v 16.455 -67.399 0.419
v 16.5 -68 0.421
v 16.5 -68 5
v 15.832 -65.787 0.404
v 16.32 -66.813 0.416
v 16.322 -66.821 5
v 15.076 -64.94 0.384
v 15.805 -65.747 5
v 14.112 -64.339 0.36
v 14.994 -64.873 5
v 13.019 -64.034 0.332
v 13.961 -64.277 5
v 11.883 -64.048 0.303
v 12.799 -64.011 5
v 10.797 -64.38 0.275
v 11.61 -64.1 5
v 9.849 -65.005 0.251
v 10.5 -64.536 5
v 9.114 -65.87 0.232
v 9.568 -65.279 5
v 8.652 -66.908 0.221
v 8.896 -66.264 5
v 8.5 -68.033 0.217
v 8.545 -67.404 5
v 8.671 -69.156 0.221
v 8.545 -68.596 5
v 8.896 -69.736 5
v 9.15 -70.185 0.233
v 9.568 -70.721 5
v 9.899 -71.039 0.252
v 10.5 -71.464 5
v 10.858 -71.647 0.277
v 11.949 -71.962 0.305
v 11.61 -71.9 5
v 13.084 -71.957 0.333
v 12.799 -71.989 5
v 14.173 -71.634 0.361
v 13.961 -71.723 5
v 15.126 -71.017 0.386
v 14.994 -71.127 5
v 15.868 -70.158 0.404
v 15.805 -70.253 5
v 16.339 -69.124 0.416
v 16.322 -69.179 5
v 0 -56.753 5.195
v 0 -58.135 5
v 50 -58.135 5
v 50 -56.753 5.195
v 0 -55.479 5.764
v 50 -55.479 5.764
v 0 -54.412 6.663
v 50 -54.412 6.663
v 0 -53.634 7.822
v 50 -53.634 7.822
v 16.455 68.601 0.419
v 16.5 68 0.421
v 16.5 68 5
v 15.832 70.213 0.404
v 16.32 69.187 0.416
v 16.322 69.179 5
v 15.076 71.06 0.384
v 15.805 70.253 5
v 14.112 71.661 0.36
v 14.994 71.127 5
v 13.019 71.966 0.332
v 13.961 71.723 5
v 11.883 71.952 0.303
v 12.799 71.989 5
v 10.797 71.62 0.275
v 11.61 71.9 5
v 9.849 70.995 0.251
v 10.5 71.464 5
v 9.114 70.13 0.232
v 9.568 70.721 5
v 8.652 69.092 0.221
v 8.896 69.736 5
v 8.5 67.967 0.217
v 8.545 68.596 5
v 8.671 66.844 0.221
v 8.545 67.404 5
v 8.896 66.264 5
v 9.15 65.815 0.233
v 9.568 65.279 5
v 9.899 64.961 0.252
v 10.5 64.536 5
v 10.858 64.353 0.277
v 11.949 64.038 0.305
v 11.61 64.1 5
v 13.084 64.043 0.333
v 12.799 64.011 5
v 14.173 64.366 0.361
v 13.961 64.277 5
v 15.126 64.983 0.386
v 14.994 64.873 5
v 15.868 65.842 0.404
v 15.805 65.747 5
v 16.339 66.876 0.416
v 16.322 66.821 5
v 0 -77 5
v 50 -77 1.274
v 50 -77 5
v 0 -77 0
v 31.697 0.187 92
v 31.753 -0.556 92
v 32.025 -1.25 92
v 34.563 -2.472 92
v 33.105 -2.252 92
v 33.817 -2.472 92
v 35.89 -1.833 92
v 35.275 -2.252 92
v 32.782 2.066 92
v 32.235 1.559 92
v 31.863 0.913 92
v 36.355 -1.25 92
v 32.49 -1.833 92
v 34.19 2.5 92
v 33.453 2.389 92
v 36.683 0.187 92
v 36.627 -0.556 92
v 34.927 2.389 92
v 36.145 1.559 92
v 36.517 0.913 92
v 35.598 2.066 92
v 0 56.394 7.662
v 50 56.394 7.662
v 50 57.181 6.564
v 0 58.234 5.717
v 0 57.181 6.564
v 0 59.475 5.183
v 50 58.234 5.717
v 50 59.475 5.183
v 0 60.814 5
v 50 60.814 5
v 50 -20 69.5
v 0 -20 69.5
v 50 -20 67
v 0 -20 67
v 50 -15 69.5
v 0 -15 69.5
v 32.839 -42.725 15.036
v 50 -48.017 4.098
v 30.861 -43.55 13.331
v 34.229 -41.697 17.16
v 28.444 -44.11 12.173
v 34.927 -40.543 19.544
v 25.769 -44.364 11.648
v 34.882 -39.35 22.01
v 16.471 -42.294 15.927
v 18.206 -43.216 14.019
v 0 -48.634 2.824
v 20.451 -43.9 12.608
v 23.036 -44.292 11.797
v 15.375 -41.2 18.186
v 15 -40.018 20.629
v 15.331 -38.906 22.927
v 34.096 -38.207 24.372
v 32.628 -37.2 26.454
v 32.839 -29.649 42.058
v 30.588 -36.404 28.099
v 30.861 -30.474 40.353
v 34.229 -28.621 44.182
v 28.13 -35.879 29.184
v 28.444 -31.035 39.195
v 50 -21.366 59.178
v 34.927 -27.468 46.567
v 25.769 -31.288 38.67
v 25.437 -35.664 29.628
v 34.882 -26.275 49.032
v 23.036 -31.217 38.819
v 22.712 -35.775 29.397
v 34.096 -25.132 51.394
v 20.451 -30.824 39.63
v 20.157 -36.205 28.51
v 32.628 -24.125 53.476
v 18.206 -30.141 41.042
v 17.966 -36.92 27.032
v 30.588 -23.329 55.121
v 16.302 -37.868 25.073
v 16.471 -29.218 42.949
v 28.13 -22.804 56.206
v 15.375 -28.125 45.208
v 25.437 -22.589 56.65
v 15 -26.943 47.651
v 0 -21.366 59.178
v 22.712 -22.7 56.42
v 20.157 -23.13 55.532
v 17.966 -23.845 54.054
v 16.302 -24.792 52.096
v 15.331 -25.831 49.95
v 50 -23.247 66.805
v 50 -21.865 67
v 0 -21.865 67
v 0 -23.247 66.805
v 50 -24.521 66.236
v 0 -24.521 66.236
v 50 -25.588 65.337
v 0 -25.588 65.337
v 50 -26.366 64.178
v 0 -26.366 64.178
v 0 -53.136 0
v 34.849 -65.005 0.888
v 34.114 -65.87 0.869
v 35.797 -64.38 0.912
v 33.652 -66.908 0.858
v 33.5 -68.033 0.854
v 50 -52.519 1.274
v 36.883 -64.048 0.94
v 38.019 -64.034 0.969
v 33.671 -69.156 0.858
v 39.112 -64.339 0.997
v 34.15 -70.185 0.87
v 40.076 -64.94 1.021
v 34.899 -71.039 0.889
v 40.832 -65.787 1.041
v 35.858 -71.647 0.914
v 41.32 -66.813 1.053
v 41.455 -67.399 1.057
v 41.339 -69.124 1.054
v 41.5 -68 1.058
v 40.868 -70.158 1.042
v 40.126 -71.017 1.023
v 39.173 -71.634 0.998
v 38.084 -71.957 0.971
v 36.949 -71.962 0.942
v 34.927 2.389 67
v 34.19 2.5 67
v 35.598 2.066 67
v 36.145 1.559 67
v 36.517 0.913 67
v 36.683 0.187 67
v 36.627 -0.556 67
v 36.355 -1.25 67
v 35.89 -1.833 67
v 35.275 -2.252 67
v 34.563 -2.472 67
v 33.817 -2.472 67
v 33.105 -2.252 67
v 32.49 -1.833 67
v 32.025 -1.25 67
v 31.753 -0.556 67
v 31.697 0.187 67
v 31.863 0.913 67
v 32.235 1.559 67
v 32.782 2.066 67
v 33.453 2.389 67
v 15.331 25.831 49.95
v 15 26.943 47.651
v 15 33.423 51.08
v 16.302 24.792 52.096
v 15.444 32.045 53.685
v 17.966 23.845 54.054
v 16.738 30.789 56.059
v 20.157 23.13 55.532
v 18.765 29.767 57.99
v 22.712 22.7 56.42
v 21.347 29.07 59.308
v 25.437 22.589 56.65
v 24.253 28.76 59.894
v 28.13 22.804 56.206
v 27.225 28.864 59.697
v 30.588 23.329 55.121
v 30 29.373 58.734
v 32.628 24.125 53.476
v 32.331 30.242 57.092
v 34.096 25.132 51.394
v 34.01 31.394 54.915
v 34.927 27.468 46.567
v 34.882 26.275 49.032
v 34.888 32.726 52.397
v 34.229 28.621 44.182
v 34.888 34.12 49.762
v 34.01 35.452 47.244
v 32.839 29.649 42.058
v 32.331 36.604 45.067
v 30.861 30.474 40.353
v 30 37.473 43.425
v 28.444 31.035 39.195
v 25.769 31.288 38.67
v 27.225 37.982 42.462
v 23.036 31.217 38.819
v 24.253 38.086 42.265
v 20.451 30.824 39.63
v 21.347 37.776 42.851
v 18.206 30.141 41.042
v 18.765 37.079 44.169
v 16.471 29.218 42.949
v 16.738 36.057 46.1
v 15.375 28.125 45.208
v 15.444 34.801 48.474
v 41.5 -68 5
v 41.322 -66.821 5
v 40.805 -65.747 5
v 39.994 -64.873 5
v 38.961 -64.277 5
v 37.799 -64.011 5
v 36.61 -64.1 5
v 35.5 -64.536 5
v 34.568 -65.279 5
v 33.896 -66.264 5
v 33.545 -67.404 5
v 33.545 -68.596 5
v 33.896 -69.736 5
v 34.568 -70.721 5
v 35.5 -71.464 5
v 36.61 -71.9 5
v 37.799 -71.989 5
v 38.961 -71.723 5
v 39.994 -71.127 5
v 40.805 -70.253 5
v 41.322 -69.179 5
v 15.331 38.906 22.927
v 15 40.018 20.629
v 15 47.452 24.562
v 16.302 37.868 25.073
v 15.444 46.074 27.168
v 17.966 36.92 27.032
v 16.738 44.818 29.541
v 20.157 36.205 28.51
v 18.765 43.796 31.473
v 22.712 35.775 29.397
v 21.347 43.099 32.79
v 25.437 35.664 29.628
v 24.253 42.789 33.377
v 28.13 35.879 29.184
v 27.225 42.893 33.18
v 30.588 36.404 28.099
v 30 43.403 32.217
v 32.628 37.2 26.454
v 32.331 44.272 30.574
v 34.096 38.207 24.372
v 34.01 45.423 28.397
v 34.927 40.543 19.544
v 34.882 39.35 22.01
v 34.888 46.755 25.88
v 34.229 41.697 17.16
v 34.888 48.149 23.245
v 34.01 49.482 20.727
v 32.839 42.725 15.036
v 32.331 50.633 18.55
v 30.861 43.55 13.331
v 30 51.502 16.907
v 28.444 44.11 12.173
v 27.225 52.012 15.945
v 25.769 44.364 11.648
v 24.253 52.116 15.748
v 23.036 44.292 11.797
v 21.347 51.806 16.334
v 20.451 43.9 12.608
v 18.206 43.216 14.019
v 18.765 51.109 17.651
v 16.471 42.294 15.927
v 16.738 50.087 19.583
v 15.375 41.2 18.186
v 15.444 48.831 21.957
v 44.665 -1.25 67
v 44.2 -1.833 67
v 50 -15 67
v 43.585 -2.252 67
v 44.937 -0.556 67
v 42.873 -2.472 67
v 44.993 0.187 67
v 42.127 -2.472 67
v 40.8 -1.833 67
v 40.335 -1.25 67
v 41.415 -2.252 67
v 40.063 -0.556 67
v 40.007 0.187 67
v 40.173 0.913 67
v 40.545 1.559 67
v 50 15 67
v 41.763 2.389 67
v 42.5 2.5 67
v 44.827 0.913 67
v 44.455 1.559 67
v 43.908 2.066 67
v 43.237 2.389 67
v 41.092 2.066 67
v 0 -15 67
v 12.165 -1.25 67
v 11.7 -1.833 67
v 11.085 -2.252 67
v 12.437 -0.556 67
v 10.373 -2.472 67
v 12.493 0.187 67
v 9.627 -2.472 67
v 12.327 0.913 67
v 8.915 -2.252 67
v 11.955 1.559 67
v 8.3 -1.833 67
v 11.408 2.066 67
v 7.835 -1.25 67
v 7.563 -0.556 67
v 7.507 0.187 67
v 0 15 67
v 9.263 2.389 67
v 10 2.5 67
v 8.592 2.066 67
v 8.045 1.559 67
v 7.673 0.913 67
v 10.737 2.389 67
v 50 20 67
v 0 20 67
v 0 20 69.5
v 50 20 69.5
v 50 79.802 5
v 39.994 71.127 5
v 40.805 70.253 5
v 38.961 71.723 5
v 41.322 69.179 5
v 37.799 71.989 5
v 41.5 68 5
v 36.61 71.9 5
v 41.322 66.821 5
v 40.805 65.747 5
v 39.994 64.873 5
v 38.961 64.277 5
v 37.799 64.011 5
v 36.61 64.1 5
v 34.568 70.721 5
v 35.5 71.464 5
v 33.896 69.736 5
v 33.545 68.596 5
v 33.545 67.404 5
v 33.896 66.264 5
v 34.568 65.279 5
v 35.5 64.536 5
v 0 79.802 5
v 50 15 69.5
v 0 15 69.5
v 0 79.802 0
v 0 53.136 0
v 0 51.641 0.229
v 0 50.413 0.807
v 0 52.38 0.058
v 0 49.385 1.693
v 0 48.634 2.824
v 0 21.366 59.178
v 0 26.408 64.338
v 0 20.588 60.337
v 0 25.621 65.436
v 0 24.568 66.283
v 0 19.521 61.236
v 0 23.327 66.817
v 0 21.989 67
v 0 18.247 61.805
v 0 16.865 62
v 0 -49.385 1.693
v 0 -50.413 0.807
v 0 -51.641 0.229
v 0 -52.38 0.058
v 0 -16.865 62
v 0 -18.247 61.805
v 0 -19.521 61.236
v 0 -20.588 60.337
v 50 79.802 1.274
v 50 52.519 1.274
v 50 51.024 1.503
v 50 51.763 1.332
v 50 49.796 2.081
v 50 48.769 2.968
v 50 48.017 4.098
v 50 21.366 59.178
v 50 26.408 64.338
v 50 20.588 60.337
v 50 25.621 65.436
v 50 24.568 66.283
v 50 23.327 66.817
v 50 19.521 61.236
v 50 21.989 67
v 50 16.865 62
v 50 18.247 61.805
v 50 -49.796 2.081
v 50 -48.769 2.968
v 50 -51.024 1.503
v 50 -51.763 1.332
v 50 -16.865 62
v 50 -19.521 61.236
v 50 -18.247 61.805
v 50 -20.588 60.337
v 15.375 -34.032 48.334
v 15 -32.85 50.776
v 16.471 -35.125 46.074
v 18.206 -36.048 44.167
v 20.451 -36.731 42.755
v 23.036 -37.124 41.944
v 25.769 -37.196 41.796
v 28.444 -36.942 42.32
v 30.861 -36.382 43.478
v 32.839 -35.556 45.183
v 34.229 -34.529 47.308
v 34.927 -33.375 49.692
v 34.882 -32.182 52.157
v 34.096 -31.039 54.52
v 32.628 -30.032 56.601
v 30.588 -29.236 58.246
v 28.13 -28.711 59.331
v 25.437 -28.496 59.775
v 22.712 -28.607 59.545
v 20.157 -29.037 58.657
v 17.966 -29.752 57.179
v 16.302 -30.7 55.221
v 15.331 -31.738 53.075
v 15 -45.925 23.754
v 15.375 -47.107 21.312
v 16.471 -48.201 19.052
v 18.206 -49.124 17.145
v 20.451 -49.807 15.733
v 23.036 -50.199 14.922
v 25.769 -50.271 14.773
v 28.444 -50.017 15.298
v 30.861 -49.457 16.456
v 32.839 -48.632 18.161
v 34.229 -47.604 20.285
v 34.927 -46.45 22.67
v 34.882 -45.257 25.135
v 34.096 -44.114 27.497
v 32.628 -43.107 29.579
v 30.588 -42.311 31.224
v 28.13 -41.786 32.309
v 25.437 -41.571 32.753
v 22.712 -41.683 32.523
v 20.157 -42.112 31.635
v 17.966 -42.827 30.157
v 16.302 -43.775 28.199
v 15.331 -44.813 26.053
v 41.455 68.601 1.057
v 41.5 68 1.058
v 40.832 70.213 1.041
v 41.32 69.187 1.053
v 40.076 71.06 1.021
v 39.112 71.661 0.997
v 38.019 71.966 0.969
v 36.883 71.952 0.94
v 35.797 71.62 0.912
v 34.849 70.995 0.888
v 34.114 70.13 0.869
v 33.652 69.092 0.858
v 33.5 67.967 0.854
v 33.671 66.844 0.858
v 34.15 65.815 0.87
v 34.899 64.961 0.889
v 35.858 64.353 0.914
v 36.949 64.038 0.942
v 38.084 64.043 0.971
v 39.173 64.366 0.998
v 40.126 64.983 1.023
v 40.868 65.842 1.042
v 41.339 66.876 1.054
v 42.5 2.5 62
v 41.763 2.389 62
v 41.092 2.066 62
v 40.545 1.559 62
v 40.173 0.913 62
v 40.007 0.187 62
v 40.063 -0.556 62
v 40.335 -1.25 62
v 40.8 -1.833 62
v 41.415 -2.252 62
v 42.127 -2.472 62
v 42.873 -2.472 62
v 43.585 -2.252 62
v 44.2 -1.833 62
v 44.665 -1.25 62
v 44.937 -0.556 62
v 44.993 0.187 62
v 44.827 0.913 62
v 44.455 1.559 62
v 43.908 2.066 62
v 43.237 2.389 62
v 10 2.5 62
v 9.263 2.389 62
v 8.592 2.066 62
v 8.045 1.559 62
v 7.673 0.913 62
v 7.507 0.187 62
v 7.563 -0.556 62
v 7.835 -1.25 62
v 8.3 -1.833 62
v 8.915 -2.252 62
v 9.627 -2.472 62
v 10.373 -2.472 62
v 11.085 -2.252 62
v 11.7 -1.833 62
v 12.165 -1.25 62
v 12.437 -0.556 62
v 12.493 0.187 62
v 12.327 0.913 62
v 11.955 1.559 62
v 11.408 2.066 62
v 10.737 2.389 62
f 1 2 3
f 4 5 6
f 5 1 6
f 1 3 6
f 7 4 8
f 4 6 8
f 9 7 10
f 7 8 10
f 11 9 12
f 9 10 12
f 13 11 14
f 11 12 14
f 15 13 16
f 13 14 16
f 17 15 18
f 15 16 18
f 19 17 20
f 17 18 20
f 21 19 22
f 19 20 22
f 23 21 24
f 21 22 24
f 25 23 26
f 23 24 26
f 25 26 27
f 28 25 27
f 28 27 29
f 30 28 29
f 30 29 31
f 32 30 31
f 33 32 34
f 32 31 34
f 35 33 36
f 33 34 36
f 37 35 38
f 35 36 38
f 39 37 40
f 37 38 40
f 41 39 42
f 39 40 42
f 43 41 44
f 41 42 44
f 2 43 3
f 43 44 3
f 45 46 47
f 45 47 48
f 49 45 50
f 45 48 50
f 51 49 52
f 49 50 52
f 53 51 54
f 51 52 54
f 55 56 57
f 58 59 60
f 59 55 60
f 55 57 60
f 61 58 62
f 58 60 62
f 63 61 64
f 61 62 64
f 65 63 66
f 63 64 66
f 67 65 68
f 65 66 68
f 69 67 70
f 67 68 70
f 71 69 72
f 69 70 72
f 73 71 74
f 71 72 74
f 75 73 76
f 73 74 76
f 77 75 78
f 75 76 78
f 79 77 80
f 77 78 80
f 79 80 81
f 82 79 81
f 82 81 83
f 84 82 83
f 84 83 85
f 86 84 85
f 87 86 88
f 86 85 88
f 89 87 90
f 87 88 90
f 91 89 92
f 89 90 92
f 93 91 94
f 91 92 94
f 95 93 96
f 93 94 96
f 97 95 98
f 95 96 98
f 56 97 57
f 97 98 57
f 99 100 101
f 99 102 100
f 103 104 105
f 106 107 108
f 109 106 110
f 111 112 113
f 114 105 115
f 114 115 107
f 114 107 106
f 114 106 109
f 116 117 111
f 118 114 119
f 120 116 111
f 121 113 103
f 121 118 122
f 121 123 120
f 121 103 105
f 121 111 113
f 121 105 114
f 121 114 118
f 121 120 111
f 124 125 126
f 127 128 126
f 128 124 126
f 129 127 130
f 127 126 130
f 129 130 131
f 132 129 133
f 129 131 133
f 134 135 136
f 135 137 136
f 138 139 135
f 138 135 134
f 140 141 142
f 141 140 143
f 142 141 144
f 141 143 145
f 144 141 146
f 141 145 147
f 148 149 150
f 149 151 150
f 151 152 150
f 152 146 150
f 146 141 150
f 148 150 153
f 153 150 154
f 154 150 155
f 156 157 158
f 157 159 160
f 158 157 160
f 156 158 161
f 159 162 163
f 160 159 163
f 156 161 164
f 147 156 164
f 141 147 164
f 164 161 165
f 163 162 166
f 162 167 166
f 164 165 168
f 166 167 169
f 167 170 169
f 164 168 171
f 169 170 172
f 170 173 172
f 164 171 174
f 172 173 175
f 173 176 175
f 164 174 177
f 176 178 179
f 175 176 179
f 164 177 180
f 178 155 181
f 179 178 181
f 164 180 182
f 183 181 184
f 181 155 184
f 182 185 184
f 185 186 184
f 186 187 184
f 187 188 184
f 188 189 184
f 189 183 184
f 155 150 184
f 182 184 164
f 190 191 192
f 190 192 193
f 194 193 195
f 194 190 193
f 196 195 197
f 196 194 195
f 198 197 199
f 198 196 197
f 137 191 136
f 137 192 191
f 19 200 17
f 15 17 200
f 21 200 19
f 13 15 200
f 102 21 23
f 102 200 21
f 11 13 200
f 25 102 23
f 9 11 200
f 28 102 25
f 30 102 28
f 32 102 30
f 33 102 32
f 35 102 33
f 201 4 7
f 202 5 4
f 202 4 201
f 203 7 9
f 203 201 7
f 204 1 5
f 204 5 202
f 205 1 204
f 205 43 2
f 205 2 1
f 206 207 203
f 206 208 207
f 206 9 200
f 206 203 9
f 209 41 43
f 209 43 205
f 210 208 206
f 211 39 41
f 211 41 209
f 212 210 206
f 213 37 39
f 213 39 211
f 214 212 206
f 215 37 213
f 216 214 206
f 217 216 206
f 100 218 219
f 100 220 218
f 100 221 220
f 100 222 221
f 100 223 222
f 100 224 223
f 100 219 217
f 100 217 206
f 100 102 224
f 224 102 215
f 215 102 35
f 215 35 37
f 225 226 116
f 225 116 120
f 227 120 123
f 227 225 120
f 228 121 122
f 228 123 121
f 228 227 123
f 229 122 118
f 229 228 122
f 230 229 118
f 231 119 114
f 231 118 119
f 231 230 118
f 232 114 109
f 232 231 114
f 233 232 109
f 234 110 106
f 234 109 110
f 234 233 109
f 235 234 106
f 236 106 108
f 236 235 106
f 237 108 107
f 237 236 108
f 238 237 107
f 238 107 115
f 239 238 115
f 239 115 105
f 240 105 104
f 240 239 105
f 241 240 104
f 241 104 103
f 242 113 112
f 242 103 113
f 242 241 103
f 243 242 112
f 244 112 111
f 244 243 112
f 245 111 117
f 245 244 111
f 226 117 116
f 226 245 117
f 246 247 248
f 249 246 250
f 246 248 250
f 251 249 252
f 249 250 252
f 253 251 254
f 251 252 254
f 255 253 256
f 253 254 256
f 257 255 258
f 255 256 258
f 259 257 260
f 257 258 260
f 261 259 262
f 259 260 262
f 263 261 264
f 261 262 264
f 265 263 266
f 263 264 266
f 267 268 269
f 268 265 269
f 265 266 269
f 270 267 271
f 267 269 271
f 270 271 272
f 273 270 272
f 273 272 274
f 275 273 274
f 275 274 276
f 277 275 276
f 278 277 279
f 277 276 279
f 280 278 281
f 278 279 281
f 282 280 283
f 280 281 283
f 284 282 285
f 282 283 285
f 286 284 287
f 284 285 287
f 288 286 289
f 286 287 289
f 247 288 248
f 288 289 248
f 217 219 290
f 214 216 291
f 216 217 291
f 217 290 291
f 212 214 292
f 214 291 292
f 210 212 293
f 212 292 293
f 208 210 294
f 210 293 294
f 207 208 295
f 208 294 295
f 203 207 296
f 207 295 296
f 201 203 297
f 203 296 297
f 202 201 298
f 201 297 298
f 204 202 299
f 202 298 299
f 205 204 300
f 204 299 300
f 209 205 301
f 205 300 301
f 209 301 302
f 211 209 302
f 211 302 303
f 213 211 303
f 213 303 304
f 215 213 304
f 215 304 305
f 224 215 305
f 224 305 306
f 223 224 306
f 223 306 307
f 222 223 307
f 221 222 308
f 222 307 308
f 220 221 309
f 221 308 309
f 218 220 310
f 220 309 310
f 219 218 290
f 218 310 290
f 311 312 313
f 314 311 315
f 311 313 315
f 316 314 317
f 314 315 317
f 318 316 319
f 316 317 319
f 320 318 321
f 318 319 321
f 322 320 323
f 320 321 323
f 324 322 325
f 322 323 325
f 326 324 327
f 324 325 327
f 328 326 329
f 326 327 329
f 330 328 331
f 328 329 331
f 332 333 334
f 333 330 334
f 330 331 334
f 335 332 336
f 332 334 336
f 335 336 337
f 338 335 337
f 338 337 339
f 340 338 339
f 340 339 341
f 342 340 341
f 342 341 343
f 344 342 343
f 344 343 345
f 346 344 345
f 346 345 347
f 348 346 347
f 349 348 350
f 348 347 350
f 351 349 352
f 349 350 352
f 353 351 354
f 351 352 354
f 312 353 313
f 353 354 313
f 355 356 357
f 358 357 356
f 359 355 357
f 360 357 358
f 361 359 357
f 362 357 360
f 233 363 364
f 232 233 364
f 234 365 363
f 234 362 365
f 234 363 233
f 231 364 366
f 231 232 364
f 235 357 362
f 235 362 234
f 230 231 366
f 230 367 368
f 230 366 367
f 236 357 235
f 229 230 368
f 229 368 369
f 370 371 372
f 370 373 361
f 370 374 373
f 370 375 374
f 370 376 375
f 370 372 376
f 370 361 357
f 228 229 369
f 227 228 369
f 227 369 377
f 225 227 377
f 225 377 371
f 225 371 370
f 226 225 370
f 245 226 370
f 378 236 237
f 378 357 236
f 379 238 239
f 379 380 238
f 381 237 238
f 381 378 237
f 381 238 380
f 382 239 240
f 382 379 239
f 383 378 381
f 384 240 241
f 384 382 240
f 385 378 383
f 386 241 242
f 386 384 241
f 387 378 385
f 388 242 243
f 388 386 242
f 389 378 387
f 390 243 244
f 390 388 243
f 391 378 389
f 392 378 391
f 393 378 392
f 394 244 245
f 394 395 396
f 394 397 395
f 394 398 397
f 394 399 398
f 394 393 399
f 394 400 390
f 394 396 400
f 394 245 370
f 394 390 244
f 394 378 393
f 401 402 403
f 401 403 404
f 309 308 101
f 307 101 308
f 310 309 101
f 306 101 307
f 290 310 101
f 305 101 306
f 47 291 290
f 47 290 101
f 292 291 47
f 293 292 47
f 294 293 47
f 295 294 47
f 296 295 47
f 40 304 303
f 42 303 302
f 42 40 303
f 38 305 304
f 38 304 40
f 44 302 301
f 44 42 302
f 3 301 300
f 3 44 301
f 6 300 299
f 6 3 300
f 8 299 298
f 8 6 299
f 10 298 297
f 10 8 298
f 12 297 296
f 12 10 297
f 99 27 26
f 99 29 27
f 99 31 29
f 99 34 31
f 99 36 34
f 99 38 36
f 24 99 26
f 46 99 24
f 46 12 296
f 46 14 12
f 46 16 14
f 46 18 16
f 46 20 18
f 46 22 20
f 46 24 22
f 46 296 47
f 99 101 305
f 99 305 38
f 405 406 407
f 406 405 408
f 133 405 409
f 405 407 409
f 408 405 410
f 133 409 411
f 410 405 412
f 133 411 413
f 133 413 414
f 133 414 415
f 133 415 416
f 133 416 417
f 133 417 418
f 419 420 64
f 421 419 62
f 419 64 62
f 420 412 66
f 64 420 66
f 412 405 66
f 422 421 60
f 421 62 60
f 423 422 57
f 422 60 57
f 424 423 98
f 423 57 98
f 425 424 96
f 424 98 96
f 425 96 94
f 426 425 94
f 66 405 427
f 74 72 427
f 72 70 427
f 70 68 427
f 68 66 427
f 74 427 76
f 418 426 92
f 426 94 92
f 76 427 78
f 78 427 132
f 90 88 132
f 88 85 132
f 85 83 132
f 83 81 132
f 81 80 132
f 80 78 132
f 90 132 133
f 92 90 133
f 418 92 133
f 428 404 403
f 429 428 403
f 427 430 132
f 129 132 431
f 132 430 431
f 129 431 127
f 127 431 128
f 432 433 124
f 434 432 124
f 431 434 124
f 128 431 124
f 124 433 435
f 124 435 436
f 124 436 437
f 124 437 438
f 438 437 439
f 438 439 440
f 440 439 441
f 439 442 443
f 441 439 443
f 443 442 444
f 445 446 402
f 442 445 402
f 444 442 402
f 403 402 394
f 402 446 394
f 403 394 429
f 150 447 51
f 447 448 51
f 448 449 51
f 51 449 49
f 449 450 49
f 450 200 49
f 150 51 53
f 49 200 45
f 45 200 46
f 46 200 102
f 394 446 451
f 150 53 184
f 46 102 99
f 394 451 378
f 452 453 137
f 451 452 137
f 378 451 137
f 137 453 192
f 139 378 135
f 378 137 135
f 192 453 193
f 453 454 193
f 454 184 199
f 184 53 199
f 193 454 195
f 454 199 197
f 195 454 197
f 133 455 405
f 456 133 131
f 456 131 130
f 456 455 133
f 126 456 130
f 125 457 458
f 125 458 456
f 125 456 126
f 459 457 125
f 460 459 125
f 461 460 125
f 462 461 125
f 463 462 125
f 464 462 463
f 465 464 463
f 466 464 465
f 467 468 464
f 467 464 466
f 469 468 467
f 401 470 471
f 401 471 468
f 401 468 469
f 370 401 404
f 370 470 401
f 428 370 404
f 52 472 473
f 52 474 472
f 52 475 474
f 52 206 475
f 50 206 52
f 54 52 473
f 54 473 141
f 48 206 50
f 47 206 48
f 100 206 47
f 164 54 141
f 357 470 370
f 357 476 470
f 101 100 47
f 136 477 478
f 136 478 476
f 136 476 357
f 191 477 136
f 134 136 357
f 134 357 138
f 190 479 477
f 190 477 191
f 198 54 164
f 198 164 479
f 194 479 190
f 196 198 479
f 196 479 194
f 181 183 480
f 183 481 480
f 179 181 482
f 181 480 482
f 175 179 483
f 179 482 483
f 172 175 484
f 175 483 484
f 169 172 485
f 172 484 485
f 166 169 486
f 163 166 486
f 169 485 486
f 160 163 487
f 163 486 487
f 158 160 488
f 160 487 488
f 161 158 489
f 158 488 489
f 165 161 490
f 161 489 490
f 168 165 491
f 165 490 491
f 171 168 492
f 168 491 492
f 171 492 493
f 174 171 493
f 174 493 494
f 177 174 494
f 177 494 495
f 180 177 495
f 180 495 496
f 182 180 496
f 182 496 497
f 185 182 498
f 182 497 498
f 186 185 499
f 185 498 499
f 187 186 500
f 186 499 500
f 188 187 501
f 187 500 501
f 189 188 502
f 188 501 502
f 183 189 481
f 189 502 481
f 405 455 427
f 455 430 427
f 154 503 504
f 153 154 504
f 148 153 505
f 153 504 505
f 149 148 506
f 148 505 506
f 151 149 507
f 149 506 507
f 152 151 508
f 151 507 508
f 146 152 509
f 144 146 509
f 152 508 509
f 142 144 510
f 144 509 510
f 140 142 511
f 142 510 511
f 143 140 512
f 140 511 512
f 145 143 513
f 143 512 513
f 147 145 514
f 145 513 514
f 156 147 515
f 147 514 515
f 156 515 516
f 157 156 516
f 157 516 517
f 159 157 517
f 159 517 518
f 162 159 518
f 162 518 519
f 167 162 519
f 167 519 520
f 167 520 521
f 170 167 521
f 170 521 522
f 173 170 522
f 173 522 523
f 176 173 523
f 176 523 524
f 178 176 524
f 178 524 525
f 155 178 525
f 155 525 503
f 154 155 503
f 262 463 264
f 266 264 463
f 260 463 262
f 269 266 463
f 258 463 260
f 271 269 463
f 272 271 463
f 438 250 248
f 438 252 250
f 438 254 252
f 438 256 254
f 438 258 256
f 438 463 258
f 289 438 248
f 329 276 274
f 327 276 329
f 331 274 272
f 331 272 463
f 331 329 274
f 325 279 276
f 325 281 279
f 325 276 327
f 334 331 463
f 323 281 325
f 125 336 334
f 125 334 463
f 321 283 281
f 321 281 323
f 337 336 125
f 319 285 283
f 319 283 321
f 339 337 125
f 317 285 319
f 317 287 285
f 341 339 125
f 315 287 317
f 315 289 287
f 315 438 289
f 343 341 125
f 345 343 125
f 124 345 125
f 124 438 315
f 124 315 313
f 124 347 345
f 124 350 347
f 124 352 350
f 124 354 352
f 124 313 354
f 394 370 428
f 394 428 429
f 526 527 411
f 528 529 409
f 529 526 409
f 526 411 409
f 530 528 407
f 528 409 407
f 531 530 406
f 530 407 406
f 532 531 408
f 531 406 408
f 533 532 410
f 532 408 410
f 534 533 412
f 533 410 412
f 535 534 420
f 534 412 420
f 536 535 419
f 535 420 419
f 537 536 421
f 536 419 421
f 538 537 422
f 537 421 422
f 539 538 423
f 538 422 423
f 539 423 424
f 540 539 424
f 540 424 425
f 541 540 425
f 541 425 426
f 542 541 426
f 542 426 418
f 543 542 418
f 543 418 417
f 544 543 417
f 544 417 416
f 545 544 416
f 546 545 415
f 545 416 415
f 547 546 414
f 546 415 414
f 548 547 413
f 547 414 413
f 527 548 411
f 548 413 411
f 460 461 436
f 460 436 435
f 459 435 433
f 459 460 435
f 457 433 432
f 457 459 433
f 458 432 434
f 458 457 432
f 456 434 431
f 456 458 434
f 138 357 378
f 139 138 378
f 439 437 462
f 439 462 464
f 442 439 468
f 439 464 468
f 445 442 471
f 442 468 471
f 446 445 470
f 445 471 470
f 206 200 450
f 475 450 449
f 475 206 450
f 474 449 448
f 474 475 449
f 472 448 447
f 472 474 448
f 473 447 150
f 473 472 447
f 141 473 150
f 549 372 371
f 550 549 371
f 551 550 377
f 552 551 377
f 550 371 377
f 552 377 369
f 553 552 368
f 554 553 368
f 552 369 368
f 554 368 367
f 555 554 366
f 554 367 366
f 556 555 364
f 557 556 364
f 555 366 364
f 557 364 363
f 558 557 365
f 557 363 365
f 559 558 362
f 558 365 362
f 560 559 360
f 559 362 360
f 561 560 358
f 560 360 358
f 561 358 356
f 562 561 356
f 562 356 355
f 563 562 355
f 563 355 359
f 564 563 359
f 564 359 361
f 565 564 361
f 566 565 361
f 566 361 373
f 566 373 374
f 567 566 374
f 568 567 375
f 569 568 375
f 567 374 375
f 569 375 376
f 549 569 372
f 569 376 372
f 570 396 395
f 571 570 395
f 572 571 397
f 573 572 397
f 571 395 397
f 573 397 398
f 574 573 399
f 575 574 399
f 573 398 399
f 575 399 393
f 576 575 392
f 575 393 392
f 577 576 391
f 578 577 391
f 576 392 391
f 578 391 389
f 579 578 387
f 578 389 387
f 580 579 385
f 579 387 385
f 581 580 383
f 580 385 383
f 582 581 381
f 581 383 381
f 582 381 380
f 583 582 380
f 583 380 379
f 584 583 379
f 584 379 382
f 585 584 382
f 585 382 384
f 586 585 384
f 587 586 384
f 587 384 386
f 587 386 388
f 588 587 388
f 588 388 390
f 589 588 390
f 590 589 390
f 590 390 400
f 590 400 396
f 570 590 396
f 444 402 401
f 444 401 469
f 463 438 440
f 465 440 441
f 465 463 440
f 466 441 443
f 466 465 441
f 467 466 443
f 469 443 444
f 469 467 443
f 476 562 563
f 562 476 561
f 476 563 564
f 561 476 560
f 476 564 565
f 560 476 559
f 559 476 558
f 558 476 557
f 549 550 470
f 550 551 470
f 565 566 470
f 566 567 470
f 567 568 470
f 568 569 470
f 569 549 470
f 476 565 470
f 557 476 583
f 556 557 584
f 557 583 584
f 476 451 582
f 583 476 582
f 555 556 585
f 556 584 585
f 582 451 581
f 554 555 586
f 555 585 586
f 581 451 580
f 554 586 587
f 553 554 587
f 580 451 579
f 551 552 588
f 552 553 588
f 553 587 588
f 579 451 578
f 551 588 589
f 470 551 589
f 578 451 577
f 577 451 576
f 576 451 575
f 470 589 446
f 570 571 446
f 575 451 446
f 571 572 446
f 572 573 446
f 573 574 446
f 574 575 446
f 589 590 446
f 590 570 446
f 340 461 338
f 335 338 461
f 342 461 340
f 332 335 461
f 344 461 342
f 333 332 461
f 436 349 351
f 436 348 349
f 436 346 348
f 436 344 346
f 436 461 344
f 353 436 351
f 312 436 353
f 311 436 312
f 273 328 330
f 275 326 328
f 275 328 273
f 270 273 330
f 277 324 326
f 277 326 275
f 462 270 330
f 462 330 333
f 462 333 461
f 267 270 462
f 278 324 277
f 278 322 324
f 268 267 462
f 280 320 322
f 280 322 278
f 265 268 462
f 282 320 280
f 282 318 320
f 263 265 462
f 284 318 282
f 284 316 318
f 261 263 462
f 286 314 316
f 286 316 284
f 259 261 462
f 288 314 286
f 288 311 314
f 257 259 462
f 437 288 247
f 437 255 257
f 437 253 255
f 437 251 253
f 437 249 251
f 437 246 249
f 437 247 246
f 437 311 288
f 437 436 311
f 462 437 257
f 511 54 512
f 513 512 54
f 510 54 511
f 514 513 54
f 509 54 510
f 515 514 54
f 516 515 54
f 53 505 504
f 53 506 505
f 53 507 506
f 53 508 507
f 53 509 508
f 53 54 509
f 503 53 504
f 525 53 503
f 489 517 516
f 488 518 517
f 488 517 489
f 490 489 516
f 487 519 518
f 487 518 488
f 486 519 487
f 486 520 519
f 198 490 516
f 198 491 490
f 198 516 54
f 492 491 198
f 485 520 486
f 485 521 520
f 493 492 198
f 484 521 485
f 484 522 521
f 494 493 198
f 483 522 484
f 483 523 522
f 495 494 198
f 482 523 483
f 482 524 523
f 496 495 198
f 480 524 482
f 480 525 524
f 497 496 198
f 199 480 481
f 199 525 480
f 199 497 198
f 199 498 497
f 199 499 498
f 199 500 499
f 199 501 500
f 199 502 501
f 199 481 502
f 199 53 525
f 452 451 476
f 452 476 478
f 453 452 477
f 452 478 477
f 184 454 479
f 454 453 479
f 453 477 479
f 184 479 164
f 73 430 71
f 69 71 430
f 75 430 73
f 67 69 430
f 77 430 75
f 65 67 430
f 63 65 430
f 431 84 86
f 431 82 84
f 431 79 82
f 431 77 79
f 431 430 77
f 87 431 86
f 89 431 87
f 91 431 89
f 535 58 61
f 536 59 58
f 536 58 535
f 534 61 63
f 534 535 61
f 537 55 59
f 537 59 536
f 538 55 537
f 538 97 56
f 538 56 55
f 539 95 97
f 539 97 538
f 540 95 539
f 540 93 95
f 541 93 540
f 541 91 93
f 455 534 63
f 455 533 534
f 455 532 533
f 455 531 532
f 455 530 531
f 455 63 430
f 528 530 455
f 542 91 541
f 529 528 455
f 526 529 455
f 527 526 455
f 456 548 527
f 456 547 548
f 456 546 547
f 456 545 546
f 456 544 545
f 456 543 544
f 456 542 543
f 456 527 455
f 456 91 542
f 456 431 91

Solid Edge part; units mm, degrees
sketch "Sketch1" plane through (0, 0, 0) normal (1, 0, 0) x (0, 1, 0)
  line L0 (-50, 0) -> (-20, 62)
  line L1 (-20, 62) -> (20, 62)
  line L2 (50, 0) -> (20, 62)
  line L3 (50, 0) -> (79.8022, 0)
  line L4 (79.8022, 0) -> (79.8022, 5)
  line L5 (79.8022, 5) -> (57.8022, 5)
  line L6 (25, 67) -> (57.8022, 5)
  line L7 (-25, 67) -> (25, 67)
  line L8 (-55, 5) -> (-25, 67)
  line L9 (-77, 5) -> (-55, 5)
  line L10 (-77, 0) -> (-77, 5)
  line L11 (-77, 0) -> (-50, 0)
  dimension "D1" = 100
  dimension "D2" = 40
  dimension "D3" = 62
  dimension "D4" = 5
  dimension "D5" = 22
  dimension "D6" = 5
  dimension "D7" = 5
  dimension "D8" = 5
  dimension "D9" = 5
  dimension "D10" = 27
extrude "Protrusion1" add sketch "Sketch1" along normal blind 50
sketch "Sketch2" plane through (25, 0, 67) normal (0, 0, 1) x (1, 0, 0)
  line L0 (-25, 20) -> (25, 20)
  line L1 (25, 20) -> (25, 15)
  line L2 (25, 15) -> (-25, 15)
  line L3 (-25, 15) -> (-25, 20)
  line L4 (-25, -20) -> (25, -20)
  line L5 (25, -20) -> (25, -15)
  line L6 (25, -15) -> (-25, -15)
  line L7 (-25, -15) -> (-25, -20)
  dimension "D1" = 15
  dimension "D2" = 5
extrude "ExtrudedProtrusion_2" add sketch "Sketch2" along normal blind 2.5
sketch "Sketch3" plane through (25, -66, 5) normal (0, 0, 1) x (1, 0, 0)
  circle A0 centre (-12.5, -2) radius 4
  circle A1 centre (12.5, -2) radius 4
  dimension "D1" = 8
  dimension "D2" = 8
  dimension "D3" = 25
  dimension "D4" = 12.5
  dimension "D5" = 9
extrude "Cutout1" cut sketch "Sketch3" against normal up to next
mirror "Mirror1" about plane through (0, 0, 0) normal (0, -1, 0) of "Cutout1"
sketch "Sketch4" plane through (25, 0, 67) normal (0, 0, 1) x (0, 1, 0)
  circle A0 centre (0, -17.5) radius 2.5
  circle A1 centre (0, 15) radius 2.5
  dimension "D1" = 5
  dimension "D2" = 5
  dimension "D3" = 30
  dimension "D4" = 10
extrude "Cutout2" cut sketch "Sketch4" against normal up to next
sketch "Sketch5" plane through (0, 0, 0) normal (0, 1, 0) x (-1, 0, 0)
  line L0 (0, 0) -> (-66.0658, 1.6838)
  line L1 (-66.0658, 1.6838) -> (-66.0658, 0)
  line L2 (-66.0658, 0) -> (0, 0)
extrude "ExtrudedCutout_3" cut sketch "Sketch5" along normal mid plane 208
fillet "Round_1" radius 5 8 edges at (25, 25, 67) (25, 49.6917, 0.6372) (25, 57.8022, 5) (25, -25, 67) (25, -20, 62) (25, -49.6917, 0.6372) (25, -55, 5) (25, 20, 62)
sketch "Sketch6" plane through (25, 41.4011, 36) normal (0, 0.8839, 0.4677) x (-1, 0, 0)
  circle A0 centre (0, 17.06) radius 10
  circle A1 centre (0, -12.94) radius 10
  dimension "D1" = 20
  dimension "D2" = 20
  dimension "D3" = 30
  dimension "D4" = 15
extrude "Cutout3" cut sketch "Sketch6" against normal up to next
mirror "Mirror2" about plane through (0, 0, 0) normal (0, -1, 0) of "Cutout3"
sketch "Sketch7" plane through (25, 0, 67) normal (0, 0, 1) x (0, 1, 0)
  circle A0 centre (0, -9.19) radius 2.5
  dimension "D1" = 8.31
  dimension "D2" = 5
extrude "Protrusion2" add sketch "Sketch7" along normal blind 25
properties material "Stainless steel"
